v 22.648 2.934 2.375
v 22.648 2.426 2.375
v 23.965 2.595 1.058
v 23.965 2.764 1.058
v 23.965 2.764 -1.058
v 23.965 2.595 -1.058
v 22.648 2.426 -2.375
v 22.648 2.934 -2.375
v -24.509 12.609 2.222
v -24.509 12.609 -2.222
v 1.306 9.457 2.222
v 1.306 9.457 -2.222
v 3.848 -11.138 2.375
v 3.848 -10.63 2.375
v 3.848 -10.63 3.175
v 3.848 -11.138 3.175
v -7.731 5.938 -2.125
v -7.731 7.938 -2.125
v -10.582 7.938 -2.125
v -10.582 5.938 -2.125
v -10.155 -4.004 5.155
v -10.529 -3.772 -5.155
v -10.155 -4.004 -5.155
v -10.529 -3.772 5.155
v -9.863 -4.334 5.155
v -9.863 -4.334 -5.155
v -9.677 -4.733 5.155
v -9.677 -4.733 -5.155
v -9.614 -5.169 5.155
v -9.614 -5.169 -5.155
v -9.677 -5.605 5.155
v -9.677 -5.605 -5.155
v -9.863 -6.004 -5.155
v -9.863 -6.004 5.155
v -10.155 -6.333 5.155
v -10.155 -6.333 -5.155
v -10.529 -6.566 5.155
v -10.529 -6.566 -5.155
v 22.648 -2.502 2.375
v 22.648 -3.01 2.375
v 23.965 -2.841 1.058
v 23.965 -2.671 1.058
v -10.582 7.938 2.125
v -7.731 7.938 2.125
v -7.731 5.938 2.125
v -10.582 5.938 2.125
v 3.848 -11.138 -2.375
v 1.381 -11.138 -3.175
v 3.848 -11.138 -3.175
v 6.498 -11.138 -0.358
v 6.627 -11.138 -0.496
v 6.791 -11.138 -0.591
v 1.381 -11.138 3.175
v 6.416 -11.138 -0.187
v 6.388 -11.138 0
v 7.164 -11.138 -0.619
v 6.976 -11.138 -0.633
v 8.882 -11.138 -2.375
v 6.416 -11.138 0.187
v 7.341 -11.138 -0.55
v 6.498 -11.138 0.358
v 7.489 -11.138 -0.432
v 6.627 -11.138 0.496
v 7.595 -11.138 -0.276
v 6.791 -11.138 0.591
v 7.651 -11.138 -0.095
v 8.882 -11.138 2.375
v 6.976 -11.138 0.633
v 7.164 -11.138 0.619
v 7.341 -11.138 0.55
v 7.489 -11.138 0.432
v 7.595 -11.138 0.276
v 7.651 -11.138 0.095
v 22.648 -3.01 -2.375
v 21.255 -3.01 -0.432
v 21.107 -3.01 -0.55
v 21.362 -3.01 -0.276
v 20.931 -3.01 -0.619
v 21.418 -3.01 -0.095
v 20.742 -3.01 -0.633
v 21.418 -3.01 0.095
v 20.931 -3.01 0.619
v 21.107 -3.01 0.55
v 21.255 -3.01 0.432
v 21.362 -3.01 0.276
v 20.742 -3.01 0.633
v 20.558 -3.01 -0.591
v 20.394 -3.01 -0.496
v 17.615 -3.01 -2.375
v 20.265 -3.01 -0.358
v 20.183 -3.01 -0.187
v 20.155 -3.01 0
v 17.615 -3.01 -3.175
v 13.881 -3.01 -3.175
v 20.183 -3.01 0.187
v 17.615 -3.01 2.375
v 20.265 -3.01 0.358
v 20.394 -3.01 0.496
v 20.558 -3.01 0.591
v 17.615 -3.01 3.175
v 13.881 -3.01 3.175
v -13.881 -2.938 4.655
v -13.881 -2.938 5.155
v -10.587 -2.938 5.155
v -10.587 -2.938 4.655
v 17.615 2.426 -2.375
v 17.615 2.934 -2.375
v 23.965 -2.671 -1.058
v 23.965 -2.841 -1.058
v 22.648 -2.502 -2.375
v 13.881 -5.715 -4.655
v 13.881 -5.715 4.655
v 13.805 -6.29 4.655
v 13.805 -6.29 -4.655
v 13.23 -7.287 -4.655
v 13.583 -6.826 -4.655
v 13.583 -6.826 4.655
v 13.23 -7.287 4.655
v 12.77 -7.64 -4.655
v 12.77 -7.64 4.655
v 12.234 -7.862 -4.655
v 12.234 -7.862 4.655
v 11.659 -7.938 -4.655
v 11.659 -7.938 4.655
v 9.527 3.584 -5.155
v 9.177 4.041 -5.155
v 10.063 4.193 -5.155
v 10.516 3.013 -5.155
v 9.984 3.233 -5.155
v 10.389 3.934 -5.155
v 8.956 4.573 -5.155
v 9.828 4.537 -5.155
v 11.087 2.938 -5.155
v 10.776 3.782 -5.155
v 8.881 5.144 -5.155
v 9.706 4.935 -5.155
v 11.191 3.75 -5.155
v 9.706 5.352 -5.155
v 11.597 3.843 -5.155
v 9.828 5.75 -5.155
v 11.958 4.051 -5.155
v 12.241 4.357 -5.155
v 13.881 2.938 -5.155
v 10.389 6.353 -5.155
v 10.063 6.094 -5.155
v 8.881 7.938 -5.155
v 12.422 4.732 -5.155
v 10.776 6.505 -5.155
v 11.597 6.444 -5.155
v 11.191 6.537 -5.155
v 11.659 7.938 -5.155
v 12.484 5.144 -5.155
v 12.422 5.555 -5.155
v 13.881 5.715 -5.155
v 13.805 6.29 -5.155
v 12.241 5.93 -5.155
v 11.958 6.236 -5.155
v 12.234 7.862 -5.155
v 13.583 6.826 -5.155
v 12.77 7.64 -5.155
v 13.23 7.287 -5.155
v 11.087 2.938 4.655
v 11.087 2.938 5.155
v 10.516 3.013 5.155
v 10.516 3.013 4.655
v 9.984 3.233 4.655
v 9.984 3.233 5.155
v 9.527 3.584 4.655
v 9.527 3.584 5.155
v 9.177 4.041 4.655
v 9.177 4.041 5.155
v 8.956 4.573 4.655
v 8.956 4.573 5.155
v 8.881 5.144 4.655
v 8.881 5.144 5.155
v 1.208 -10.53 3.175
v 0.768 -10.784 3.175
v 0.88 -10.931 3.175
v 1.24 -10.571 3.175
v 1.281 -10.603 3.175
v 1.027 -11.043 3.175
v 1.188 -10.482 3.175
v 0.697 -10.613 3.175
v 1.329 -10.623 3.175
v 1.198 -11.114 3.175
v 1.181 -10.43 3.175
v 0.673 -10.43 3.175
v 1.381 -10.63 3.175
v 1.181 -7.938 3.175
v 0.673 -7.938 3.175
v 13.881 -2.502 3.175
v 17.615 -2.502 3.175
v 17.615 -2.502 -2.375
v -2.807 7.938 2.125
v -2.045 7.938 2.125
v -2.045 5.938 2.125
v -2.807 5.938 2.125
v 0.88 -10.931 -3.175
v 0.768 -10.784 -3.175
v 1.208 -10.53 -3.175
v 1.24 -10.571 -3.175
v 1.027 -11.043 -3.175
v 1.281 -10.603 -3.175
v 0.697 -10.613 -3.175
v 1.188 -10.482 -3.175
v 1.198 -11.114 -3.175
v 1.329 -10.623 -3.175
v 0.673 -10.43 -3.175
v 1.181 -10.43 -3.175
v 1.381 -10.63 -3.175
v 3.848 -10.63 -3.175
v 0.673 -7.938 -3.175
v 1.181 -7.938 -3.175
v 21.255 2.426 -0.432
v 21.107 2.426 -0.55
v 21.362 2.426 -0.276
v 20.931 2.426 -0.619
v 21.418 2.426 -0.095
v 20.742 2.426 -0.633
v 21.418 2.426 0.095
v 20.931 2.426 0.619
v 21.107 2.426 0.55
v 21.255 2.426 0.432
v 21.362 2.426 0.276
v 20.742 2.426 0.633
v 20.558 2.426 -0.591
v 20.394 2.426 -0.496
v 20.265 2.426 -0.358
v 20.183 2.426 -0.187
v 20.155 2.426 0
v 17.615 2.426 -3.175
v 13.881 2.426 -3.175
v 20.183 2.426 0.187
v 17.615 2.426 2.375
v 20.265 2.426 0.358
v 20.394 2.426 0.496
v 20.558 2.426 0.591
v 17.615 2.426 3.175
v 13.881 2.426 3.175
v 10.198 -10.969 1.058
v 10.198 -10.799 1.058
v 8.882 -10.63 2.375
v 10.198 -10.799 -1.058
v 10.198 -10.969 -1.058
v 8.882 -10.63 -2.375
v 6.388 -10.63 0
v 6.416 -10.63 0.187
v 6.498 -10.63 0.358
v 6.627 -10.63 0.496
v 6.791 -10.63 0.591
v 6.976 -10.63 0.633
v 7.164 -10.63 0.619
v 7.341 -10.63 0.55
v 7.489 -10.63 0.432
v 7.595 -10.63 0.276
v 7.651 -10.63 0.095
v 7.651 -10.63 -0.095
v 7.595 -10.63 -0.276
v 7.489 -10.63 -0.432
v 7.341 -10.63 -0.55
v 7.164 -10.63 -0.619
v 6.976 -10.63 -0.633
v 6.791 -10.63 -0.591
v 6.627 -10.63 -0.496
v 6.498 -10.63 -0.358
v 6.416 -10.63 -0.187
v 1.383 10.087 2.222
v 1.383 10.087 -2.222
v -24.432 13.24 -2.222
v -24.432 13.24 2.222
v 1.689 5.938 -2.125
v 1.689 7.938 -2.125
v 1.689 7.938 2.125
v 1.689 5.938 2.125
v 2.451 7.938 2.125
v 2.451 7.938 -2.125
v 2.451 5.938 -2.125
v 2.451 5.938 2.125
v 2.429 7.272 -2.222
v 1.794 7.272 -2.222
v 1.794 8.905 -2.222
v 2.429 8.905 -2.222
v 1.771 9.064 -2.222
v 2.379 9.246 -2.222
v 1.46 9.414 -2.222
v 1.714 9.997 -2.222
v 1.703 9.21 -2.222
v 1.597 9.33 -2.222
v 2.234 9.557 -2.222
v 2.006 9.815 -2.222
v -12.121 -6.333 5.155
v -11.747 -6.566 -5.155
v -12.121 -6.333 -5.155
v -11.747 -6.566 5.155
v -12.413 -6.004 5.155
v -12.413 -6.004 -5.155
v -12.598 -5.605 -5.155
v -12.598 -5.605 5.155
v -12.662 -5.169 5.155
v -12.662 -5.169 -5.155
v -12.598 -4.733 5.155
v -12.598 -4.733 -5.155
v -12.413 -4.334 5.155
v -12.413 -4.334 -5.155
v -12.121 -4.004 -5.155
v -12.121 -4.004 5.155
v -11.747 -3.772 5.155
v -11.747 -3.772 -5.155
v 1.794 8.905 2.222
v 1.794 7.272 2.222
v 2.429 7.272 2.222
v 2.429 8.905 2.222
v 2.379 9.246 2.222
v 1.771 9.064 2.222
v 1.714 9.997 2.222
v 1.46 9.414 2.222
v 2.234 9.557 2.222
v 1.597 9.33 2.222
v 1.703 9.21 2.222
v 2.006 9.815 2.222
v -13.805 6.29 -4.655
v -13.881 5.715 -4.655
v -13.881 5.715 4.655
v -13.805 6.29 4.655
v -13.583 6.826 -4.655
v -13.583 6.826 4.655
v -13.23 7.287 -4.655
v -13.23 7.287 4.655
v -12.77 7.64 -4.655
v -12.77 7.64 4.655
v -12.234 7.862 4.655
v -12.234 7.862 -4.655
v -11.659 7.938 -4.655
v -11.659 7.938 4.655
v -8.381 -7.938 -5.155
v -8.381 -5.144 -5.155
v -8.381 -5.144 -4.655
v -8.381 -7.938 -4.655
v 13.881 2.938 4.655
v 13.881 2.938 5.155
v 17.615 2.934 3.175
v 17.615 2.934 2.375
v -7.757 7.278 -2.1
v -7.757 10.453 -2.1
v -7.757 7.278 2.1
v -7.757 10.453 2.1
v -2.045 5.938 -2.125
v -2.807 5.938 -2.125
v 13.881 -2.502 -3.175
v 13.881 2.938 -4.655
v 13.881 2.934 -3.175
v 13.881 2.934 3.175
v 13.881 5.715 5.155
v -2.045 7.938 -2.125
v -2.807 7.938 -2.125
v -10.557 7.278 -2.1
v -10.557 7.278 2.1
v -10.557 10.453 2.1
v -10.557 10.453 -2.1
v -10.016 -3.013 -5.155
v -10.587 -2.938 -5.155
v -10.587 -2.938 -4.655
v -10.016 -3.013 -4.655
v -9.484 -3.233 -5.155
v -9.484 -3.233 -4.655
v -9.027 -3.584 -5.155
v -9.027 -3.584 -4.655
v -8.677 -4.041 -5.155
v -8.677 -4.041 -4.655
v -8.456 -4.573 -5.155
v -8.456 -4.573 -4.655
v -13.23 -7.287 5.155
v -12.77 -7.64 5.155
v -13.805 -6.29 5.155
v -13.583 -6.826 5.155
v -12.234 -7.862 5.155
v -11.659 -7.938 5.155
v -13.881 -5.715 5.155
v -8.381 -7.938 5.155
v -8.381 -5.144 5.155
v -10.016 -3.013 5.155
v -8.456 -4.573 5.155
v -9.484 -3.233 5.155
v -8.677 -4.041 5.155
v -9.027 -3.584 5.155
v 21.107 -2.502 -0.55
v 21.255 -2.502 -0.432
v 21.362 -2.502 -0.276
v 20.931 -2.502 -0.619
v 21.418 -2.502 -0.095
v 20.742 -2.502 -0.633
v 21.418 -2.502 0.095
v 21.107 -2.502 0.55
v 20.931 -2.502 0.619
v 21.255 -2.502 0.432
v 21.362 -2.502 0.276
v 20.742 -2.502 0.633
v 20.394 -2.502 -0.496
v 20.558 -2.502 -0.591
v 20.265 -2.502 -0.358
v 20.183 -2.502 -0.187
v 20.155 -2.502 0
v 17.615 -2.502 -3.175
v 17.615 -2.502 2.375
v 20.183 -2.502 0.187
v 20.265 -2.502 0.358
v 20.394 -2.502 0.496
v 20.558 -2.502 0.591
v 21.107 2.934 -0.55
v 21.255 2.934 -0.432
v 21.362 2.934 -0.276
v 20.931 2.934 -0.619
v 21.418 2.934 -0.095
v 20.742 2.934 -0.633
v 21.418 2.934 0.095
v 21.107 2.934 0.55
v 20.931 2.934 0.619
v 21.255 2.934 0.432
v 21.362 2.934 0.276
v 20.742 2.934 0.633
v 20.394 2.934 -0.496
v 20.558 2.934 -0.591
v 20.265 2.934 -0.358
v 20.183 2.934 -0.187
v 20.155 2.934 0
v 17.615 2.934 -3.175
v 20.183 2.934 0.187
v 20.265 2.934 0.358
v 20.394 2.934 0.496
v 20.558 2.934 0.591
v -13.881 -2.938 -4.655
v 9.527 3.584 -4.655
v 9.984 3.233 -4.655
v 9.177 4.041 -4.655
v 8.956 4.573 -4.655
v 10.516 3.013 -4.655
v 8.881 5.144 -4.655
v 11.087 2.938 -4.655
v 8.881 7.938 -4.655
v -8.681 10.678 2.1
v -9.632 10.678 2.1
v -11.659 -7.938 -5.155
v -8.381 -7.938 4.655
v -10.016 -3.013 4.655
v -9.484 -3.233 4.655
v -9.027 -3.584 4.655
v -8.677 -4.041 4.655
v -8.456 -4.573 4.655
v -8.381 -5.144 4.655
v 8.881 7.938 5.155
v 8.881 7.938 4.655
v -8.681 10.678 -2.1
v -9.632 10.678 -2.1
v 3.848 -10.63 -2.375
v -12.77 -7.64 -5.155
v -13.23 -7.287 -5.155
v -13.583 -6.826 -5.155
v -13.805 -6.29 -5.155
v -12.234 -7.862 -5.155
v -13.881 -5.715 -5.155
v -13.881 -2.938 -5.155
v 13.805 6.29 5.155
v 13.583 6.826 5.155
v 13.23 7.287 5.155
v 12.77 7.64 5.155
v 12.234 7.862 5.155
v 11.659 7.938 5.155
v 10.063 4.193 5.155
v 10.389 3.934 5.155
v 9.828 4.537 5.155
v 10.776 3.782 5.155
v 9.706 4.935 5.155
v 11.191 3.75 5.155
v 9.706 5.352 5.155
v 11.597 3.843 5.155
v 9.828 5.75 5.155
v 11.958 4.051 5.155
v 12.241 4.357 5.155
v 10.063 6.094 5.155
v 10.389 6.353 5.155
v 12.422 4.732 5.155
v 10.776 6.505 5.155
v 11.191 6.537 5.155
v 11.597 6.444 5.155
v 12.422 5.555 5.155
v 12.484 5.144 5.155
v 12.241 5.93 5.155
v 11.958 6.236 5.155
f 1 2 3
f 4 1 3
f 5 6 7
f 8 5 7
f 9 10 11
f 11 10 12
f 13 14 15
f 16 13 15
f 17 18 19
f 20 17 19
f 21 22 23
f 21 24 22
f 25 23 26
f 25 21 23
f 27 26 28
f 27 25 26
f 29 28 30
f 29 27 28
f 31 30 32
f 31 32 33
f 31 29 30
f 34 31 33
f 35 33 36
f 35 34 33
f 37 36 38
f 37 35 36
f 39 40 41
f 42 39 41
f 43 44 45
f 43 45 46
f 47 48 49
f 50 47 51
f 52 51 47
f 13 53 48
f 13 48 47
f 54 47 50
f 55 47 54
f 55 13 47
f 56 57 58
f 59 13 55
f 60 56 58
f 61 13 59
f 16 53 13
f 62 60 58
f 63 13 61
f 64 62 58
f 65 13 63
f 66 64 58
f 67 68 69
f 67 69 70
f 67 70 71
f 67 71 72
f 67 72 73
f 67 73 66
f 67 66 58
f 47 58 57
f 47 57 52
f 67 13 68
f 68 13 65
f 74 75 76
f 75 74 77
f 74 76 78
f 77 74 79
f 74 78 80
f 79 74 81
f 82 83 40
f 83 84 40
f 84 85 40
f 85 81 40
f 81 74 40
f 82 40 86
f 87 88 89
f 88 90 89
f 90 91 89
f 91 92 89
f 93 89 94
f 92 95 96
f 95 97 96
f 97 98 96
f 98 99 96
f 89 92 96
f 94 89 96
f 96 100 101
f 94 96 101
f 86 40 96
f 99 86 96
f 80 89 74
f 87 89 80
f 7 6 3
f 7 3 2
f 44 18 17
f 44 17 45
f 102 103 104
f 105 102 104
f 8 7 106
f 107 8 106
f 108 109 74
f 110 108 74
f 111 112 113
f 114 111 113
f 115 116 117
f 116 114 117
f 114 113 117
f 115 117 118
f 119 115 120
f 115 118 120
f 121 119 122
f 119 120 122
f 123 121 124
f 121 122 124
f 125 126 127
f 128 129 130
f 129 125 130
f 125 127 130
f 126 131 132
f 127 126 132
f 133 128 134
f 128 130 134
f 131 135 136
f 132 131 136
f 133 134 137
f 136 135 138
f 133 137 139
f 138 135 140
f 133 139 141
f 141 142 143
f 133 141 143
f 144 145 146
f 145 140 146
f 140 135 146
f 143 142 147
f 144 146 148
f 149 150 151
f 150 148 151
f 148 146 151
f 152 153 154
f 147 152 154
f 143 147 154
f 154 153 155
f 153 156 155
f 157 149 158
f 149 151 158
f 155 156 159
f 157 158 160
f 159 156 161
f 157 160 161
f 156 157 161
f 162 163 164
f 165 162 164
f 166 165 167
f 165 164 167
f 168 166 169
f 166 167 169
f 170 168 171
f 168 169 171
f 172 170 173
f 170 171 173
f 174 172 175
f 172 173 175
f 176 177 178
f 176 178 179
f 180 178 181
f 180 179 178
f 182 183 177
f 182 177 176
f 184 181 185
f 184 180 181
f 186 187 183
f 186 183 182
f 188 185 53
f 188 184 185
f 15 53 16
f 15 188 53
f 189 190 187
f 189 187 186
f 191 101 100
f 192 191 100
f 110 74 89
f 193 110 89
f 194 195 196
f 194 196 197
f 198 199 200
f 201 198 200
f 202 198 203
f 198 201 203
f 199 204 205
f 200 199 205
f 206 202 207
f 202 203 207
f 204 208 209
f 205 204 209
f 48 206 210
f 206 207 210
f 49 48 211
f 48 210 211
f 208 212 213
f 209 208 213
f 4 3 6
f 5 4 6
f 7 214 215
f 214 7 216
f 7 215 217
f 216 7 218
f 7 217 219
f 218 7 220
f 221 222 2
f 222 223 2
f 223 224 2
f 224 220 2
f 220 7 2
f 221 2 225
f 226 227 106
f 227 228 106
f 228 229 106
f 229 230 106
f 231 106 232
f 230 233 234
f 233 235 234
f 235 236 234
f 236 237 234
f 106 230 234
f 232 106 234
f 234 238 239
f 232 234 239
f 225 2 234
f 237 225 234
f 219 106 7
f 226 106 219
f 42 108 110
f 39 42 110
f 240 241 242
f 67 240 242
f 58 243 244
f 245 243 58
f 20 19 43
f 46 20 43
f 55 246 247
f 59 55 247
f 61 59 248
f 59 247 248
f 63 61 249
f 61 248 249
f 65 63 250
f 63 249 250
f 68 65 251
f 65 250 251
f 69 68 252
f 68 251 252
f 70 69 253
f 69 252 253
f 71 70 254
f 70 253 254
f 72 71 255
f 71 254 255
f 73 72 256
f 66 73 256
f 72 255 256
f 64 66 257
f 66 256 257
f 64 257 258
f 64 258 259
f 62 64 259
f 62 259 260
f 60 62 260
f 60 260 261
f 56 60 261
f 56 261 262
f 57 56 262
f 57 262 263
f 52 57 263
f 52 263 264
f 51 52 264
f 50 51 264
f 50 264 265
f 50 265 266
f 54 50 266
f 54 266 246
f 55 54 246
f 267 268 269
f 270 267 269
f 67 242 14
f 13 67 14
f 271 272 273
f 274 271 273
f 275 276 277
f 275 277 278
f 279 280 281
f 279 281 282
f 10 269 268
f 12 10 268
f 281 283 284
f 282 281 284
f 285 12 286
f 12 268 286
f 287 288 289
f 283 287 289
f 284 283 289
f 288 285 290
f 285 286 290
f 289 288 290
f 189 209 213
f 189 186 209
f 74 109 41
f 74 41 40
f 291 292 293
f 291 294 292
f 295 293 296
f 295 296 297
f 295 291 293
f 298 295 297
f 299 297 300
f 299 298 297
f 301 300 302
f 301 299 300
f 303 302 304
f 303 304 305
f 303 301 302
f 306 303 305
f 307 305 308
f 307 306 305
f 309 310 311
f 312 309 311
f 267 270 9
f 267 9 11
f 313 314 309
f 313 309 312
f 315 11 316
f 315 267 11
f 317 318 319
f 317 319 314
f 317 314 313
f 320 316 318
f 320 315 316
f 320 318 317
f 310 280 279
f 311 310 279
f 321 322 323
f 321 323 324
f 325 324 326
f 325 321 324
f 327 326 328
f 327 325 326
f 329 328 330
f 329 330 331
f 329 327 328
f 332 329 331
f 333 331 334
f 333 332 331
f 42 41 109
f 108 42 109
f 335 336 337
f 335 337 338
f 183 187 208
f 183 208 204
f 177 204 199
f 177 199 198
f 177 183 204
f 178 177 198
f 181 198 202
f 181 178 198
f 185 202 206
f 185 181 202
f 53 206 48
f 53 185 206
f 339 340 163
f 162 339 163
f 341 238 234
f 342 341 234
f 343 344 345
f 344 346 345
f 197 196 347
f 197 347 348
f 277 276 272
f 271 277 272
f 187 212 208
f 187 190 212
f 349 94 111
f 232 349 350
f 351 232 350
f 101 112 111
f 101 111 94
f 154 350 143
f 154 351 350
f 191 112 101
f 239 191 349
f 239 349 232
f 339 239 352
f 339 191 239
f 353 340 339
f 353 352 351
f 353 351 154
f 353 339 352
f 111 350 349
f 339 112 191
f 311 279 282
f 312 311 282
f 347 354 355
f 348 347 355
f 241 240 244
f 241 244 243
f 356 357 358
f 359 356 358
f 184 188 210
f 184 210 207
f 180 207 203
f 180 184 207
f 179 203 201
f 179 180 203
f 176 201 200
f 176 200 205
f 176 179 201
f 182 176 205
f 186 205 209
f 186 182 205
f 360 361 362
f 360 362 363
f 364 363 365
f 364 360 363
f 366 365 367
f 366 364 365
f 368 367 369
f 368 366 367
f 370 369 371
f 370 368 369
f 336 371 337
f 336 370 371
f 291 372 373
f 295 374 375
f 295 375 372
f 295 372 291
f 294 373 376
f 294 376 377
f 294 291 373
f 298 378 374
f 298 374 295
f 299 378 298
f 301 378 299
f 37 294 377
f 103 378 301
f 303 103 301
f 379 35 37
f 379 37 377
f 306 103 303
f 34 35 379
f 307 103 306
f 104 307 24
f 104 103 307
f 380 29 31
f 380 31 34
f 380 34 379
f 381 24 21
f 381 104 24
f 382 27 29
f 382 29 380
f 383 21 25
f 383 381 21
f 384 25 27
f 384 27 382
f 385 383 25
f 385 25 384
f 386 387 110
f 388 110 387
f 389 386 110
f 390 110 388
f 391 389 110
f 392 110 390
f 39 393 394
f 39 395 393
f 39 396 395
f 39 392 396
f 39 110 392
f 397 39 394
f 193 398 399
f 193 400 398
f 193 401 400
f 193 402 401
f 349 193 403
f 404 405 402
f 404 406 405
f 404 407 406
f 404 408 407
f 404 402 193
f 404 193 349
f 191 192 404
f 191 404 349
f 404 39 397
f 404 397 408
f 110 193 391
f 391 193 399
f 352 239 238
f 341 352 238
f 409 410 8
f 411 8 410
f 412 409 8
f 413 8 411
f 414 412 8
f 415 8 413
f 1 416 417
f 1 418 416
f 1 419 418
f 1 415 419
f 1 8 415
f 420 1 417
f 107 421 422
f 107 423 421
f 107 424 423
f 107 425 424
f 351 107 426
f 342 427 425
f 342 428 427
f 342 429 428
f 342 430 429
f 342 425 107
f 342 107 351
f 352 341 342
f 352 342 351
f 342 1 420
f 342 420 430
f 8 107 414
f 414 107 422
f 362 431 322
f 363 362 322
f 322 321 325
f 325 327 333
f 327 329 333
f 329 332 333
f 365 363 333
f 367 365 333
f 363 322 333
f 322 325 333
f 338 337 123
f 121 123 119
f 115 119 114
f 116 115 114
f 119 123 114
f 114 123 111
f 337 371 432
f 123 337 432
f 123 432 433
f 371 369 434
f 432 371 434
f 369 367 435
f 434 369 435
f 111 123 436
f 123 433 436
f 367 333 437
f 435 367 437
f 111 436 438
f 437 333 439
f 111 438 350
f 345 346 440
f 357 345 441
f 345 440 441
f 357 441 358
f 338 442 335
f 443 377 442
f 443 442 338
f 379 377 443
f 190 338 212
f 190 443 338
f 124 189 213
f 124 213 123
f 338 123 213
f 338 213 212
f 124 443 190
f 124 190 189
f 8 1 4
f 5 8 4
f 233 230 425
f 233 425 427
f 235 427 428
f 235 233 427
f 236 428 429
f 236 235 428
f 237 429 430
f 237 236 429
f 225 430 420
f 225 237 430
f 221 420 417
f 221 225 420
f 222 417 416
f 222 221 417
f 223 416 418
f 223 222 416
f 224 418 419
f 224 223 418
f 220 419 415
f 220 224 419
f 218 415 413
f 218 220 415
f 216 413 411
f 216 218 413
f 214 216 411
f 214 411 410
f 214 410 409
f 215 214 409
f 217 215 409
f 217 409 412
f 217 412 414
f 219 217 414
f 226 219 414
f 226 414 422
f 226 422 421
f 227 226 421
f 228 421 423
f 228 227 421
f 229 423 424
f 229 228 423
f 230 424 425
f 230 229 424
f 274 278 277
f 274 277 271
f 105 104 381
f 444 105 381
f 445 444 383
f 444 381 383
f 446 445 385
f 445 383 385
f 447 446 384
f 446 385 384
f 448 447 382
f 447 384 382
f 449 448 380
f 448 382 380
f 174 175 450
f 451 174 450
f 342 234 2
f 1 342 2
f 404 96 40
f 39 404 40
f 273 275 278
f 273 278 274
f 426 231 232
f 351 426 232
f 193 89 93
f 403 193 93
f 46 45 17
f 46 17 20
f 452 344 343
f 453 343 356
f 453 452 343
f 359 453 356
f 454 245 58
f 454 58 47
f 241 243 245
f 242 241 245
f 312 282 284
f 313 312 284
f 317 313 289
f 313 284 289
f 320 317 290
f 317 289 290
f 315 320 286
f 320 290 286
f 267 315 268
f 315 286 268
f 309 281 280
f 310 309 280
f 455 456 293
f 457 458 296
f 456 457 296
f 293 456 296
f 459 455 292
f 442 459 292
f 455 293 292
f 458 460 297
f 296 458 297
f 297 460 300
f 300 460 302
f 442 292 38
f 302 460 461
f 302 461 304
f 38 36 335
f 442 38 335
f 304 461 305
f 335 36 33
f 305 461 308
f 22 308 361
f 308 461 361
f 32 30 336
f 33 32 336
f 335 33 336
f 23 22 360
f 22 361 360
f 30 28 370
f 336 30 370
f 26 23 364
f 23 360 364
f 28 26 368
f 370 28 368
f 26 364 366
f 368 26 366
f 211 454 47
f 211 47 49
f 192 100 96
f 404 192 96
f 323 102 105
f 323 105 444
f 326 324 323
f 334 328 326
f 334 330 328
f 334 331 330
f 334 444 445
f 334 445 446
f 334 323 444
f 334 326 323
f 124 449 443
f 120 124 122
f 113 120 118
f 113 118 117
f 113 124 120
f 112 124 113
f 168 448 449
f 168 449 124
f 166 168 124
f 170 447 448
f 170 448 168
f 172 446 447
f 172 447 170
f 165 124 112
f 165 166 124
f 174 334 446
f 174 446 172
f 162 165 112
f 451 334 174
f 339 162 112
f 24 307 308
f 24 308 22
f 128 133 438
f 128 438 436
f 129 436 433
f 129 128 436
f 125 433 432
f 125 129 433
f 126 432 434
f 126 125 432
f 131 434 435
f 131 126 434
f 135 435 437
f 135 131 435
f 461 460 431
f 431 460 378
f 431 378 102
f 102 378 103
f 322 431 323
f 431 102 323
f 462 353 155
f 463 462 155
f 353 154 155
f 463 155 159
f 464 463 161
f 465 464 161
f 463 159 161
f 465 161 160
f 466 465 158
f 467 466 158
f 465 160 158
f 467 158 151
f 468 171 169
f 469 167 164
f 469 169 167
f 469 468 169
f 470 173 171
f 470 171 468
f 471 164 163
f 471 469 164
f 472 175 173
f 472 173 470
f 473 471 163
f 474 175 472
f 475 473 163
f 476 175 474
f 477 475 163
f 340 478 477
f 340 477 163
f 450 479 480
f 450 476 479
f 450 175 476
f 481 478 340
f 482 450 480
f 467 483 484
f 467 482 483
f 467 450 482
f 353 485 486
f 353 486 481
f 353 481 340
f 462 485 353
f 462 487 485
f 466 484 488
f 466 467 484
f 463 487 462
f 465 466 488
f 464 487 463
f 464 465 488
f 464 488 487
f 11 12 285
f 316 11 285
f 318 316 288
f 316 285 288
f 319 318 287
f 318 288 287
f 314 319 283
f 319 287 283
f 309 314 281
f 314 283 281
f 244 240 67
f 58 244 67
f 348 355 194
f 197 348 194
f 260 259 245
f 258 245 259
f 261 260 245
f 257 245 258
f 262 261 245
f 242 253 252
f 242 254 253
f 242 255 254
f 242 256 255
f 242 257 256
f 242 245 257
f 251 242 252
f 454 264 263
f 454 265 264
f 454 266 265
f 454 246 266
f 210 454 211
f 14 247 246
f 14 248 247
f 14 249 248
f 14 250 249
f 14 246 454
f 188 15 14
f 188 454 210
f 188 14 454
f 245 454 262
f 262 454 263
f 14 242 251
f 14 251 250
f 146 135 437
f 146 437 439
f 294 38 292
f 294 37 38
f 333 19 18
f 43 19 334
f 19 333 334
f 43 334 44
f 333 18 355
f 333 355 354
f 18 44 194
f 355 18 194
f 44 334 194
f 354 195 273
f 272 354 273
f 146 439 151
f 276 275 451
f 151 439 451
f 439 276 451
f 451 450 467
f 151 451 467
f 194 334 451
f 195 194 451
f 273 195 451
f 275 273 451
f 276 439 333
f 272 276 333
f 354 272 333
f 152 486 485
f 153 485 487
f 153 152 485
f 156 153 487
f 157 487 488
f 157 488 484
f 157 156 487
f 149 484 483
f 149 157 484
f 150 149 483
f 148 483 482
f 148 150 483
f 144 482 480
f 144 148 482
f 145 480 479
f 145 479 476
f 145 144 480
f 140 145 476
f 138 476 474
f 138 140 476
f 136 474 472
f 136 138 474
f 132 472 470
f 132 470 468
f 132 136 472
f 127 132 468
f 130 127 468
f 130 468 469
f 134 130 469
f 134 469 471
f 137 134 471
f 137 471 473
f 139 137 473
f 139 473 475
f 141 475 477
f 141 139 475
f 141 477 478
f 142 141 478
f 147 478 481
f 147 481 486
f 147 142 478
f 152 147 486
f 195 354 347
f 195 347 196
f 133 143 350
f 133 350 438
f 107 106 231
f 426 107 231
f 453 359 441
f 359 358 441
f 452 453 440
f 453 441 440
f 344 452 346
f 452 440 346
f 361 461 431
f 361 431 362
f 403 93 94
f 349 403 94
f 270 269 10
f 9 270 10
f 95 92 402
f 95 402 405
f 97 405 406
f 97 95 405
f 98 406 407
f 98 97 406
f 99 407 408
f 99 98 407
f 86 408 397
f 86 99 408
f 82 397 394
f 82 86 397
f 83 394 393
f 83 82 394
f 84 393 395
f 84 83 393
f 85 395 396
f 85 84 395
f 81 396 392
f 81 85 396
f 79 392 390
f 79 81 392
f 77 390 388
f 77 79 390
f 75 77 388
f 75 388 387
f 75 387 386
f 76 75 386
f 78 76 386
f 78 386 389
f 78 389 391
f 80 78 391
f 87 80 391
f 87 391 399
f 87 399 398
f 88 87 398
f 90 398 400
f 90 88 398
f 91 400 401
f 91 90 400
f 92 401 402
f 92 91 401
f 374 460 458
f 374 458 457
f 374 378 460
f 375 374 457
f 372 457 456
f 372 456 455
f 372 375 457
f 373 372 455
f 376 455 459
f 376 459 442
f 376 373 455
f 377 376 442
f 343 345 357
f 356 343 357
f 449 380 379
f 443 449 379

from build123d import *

# Parameters (mm, degrees)
SKETCH1_W               = 27.7622
SKETCH1_H               = 15.875
SKETCH1_R               = 1.397
EXTRUDE1_DEPTH          = 5.155
FILLET1_R               = 2.2225
EXTRUDE2_DEPTH          = 2.1
SKETCH3_W               = 2.8508
SKETCH3_H               = 4.2508
SKETCH3_W_2             = 0.762
CUT_EXTRUDE1_DEPTH      = 2
CUT_EXTRUDE2_DEPTH      = 0.5
EXTRUDE3_DEPTH          = 3.175
SKETCH6_R               = 0.635
CUT_EXTRUDE3_DEPTH      = 26.970827061
EXTRUDE4_START          = -5.5118
EXTRUDE4_OUTLINE_R      = 0.635
EXTRUDE4_DEPTH          = 0.508
LPATTERN1_COUNT         = 2
LPATTERN1_PITCH         = 5.4356
CUT_EXTRUDE4_DEPTH      = 27.924770629
CUT_EXTRUDE4_DEPTH_BACK = 27.924770629
BODY_MOVE_COPY2_START   = -2.2225
BODY_MOVE_COPY2_DEPTH   = 4.445


# Read off the part's stored shape, not the designer's step: Extrude4, Body-Move/Copy2
with BuildPart() as part:
    # Sketch1 → Extrude1 (new, symmetric)
    with BuildSketch(Plane.XY):
        Rectangle(SKETCH1_W, SKETCH1_H)
        with Locations((11.0871, 5.1435)):
            Circle(SKETCH1_R, mode=Mode.SUBTRACT)
        with BuildLine():
            Line((-11.746970603, -3.7719), (-10.528829397, -3.7719))
            ThreePointArc((-10.528829397, -3.7719), (-9.6139, -5.1689), (-10.528829397, -6.5659))
            Line((-10.528829397, -6.5659), (-11.746970603, -6.5659))
            ThreePointArc((-11.746970603, -6.5659), (-12.6619, -5.1689), (-11.746970603, -3.7719))
        make_face(mode=Mode.SUBTRACT)
    extrude(amount=EXTRUDE1_DEPTH, both=True)

    # Fillet1
    fillet1_edges = [part.edges().sort_by_distance(p)[0] for p in [
        (-13.8811, 7.9375, 0),
        (13.8811, 7.9375, 0),
        (13.8811, -7.9375, 0),
        (-13.8811, -7.9375, 0),
    ]]
    fillet(fillet1_edges, radius=FILLET1_R)

    # Sketch3 → Cut-Extrude1 (cut)
    with BuildSketch(Plane(origin=(0, 7.9375, 0), x_dir=(-1, 0, 0), z_dir=(0, 1, 0))):
        with Locations((9.1567, 0)):
            Rectangle(SKETCH3_W, SKETCH3_H)
        with Locations((2.4257, 0)):
            Rectangle(SKETCH3_W_2, SKETCH3_H)
        with Locations((-2.0701, 0)):
            Rectangle(SKETCH3_W_2, SKETCH3_H)
    extrude(amount=-CUT_EXTRUDE1_DEPTH, mode=Mode.SUBTRACT)

    # Sketch4 → Cut-Extrude2 (cut)
    with BuildSketch(Plane.XY.offset(5.155)):
        with BuildLine():
            Line((-8.3811, -7.9375), (13.8811, -7.9375))
            Line((13.8811, -7.9375), (13.8811, 2.9375))
            Line((13.8811, 2.9375), (11.0871, 2.9375))
            ThreePointArc((11.0871, 2.9375), (9.527222441, 3.583622441), (8.8811, 5.1435))
            Line((8.8811, 5.1435), (8.8811, 7.9375))
            Line((8.8811, 7.9375), (-13.8811, 7.9375))
            Line((-13.8811, 7.9375), (-13.8811, -2.9375))
            Line((-13.8811, -2.9375), (-10.5871, -2.9375))
            ThreePointArc((-10.5871, -2.9375), (-9.027222441, -3.583622441), (-8.3811, -5.1435))
            Line((-8.3811, -5.1435), (-8.3811, -7.9375))
        make_face()
    cut_extrude2 = extrude(amount=-CUT_EXTRUDE2_DEPTH, mode=Mode.SUBTRACT)

    # Mirror1: Cut-Extrude2 across plane
    add(cut_extrude2.mirror(Plane.XY), mode=Mode.SUBTRACT)

    # Sketch5 → Extrude3 (add, symmetric)
    with BuildSketch(Plane.XY):
        with BuildLine():
            Line((0.6731, -7.9375), (0.6731, -10.4299))
            ThreePointArc((0.6731, -10.4299), (0.880468399, -10.930531601), (1.3811, -11.1379))
            Line((1.3811, -11.1379), (10.1981, -11.1379))
            Line((10.1981, -11.1379), (10.1981, -10.6299))
            Line((10.1981, -10.6299), (1.3811, -10.6299))
            ThreePointArc((1.3811, -10.6299), (1.239678644, -10.571321356), (1.1811, -10.4299))
            Line((1.1811, -10.4299), (1.1811, -7.9375))
            Line((1.1811, -7.9375), (0.6731, -7.9375))
        make_face()
    extrude(amount=EXTRUDE3_DEPTH, both=True)

    # Sketch6 → Cut-Extrude3 (cut, through all)
    with BuildSketch(Plane(origin=(0, -10.6299, 0), x_dir=(-1, 0, 0), z_dir=(0, 1, 0))):
        with Locations((-7.0231, 0)):
            Circle(SKETCH6_R)
        Polygon((-10.1981, 1.058333333), (-8.881533333, 2.3749), (-3.8481, 2.3749), (-3.8481, 3.175), (-10.1981, 3.175), align=None)
        Polygon((-10.1981, -3.175), (-10.1981, -1.058333333), (-8.881533333, -2.3749), (-3.8481, -2.3749), (-3.8481, -3.175), align=None)
    extrude(amount=-CUT_EXTRUDE3_DEPTH, mode=Mode.SUBTRACT)

    # Extrude4 outline → Extrude4 (add)
    with BuildSketch(Plane(origin=(0, 7.9375, 0), x_dir=(-1, 0, 0), z_dir=(0, 1, 0)).offset(EXTRUDE4_START)):
        Polygon((-13.8811, -3.175), (-13.8811, 3.175), (-17.6149, 3.175), (-17.6149, 2.3749), (-22.648333333, 2.3749), (-23.9649, 1.058333333), (-23.9649, -1.058333333), (-22.648333333, -2.3749), (-17.6149, -2.3749), (-17.6149, -3.175), align=None)
        with Locations((-20.7899, 0)):
            Circle(EXTRUDE4_OUTLINE_R, mode=Mode.SUBTRACT)
    extrude4 = extrude(amount=EXTRUDE4_DEPTH)

    # LPattern1: Extrude4 ×2
    with Locations(*[(0, -i * LPATTERN1_PITCH, 0) for i in range(1, LPATTERN1_COUNT)]):
        add(extrude4)

    # Sketch7 → Cut-Extrude4 (cut, two sides: drawn at the far end of the back side and taken through both)
    with BuildSketch(Plane.XY.offset(-CUT_EXTRUDE4_DEPTH_BACK)):
        Polygon((8.881533333, -10.6299), (10.1981, -10.6299), (10.1981, -10.799233333), align=None)
        Polygon((8.881533333, -11.1379), (10.1981, -11.1379), (10.1981, -10.968566667), align=None)
        Polygon((22.648333333, 2.9337), (23.9649, 2.764366667), (23.9649, 2.9337), align=None)
        Polygon((23.9649, 2.595033333), (22.648333333, 2.4257), (23.9649, 2.4257), align=None)
        Polygon((22.648333333, -2.5019), (23.9649, -2.5019), (23.9649, -2.671233333), align=None)
        Polygon((23.9649, -2.840566667), (22.648333333, -3.0099), (23.9649, -3.0099), align=None)
    extrude(amount=CUT_EXTRUDE4_DEPTH + CUT_EXTRUDE4_DEPTH_BACK, mode=Mode.SUBTRACT)


with BuildPart() as body_2:
    # Sketch2 → Extrude2 (new, symmetric)
    with BuildSketch(Plane.XY):
        with BuildLine():
            Line((-10.5567, 7.278098799), (-10.5567, 10.453098799))
            ThreePointArc((-10.5567, 10.453098799), (-9.1567, 10.7061), (-7.7567, 10.453098799))
            Line((-7.7567, 10.453098799), (-7.7567, 7.278098799))
            Line((-7.7567, 7.278098799), (-10.5567, 7.278098799))
        make_face()
    extrude(amount=EXTRUDE2_DEPTH, both=True)


with BuildPart() as body_3:
    # Body-Move/Copy2 outline → Body-Move/Copy2 (new body)
    with BuildSketch(Plane.XY.offset(BODY_MOVE_COPY2_START)):
        with BuildLine():
            Line((1.793875, 7.271748799), (2.428875, 7.271748799))
            Line((2.428875, 7.271748799), (2.428875, 8.905227531))
            ThreePointArc((2.428875, 8.905227531), (2.129720805, 9.694447205), (1.38258806, 10.087071181))
            Line((1.38258806, 10.087071181), (-24.431625, 13.23975))
            Line((-24.431625, 13.23975), (-24.508605299, 12.609433386))
            Line((-24.508605299, 12.609433386), (1.305607762, 9.456754568))
            ThreePointArc((1.305607762, 9.456754568), (1.654269709, 9.273530045), (1.793875, 8.905227531))
            Line((1.793875, 8.905227531), (1.793875, 7.271748799))
        make_face()
    extrude(amount=BODY_MOVE_COPY2_DEPTH)


solid = Compound([part.part, body_2.part, body_3.part])
